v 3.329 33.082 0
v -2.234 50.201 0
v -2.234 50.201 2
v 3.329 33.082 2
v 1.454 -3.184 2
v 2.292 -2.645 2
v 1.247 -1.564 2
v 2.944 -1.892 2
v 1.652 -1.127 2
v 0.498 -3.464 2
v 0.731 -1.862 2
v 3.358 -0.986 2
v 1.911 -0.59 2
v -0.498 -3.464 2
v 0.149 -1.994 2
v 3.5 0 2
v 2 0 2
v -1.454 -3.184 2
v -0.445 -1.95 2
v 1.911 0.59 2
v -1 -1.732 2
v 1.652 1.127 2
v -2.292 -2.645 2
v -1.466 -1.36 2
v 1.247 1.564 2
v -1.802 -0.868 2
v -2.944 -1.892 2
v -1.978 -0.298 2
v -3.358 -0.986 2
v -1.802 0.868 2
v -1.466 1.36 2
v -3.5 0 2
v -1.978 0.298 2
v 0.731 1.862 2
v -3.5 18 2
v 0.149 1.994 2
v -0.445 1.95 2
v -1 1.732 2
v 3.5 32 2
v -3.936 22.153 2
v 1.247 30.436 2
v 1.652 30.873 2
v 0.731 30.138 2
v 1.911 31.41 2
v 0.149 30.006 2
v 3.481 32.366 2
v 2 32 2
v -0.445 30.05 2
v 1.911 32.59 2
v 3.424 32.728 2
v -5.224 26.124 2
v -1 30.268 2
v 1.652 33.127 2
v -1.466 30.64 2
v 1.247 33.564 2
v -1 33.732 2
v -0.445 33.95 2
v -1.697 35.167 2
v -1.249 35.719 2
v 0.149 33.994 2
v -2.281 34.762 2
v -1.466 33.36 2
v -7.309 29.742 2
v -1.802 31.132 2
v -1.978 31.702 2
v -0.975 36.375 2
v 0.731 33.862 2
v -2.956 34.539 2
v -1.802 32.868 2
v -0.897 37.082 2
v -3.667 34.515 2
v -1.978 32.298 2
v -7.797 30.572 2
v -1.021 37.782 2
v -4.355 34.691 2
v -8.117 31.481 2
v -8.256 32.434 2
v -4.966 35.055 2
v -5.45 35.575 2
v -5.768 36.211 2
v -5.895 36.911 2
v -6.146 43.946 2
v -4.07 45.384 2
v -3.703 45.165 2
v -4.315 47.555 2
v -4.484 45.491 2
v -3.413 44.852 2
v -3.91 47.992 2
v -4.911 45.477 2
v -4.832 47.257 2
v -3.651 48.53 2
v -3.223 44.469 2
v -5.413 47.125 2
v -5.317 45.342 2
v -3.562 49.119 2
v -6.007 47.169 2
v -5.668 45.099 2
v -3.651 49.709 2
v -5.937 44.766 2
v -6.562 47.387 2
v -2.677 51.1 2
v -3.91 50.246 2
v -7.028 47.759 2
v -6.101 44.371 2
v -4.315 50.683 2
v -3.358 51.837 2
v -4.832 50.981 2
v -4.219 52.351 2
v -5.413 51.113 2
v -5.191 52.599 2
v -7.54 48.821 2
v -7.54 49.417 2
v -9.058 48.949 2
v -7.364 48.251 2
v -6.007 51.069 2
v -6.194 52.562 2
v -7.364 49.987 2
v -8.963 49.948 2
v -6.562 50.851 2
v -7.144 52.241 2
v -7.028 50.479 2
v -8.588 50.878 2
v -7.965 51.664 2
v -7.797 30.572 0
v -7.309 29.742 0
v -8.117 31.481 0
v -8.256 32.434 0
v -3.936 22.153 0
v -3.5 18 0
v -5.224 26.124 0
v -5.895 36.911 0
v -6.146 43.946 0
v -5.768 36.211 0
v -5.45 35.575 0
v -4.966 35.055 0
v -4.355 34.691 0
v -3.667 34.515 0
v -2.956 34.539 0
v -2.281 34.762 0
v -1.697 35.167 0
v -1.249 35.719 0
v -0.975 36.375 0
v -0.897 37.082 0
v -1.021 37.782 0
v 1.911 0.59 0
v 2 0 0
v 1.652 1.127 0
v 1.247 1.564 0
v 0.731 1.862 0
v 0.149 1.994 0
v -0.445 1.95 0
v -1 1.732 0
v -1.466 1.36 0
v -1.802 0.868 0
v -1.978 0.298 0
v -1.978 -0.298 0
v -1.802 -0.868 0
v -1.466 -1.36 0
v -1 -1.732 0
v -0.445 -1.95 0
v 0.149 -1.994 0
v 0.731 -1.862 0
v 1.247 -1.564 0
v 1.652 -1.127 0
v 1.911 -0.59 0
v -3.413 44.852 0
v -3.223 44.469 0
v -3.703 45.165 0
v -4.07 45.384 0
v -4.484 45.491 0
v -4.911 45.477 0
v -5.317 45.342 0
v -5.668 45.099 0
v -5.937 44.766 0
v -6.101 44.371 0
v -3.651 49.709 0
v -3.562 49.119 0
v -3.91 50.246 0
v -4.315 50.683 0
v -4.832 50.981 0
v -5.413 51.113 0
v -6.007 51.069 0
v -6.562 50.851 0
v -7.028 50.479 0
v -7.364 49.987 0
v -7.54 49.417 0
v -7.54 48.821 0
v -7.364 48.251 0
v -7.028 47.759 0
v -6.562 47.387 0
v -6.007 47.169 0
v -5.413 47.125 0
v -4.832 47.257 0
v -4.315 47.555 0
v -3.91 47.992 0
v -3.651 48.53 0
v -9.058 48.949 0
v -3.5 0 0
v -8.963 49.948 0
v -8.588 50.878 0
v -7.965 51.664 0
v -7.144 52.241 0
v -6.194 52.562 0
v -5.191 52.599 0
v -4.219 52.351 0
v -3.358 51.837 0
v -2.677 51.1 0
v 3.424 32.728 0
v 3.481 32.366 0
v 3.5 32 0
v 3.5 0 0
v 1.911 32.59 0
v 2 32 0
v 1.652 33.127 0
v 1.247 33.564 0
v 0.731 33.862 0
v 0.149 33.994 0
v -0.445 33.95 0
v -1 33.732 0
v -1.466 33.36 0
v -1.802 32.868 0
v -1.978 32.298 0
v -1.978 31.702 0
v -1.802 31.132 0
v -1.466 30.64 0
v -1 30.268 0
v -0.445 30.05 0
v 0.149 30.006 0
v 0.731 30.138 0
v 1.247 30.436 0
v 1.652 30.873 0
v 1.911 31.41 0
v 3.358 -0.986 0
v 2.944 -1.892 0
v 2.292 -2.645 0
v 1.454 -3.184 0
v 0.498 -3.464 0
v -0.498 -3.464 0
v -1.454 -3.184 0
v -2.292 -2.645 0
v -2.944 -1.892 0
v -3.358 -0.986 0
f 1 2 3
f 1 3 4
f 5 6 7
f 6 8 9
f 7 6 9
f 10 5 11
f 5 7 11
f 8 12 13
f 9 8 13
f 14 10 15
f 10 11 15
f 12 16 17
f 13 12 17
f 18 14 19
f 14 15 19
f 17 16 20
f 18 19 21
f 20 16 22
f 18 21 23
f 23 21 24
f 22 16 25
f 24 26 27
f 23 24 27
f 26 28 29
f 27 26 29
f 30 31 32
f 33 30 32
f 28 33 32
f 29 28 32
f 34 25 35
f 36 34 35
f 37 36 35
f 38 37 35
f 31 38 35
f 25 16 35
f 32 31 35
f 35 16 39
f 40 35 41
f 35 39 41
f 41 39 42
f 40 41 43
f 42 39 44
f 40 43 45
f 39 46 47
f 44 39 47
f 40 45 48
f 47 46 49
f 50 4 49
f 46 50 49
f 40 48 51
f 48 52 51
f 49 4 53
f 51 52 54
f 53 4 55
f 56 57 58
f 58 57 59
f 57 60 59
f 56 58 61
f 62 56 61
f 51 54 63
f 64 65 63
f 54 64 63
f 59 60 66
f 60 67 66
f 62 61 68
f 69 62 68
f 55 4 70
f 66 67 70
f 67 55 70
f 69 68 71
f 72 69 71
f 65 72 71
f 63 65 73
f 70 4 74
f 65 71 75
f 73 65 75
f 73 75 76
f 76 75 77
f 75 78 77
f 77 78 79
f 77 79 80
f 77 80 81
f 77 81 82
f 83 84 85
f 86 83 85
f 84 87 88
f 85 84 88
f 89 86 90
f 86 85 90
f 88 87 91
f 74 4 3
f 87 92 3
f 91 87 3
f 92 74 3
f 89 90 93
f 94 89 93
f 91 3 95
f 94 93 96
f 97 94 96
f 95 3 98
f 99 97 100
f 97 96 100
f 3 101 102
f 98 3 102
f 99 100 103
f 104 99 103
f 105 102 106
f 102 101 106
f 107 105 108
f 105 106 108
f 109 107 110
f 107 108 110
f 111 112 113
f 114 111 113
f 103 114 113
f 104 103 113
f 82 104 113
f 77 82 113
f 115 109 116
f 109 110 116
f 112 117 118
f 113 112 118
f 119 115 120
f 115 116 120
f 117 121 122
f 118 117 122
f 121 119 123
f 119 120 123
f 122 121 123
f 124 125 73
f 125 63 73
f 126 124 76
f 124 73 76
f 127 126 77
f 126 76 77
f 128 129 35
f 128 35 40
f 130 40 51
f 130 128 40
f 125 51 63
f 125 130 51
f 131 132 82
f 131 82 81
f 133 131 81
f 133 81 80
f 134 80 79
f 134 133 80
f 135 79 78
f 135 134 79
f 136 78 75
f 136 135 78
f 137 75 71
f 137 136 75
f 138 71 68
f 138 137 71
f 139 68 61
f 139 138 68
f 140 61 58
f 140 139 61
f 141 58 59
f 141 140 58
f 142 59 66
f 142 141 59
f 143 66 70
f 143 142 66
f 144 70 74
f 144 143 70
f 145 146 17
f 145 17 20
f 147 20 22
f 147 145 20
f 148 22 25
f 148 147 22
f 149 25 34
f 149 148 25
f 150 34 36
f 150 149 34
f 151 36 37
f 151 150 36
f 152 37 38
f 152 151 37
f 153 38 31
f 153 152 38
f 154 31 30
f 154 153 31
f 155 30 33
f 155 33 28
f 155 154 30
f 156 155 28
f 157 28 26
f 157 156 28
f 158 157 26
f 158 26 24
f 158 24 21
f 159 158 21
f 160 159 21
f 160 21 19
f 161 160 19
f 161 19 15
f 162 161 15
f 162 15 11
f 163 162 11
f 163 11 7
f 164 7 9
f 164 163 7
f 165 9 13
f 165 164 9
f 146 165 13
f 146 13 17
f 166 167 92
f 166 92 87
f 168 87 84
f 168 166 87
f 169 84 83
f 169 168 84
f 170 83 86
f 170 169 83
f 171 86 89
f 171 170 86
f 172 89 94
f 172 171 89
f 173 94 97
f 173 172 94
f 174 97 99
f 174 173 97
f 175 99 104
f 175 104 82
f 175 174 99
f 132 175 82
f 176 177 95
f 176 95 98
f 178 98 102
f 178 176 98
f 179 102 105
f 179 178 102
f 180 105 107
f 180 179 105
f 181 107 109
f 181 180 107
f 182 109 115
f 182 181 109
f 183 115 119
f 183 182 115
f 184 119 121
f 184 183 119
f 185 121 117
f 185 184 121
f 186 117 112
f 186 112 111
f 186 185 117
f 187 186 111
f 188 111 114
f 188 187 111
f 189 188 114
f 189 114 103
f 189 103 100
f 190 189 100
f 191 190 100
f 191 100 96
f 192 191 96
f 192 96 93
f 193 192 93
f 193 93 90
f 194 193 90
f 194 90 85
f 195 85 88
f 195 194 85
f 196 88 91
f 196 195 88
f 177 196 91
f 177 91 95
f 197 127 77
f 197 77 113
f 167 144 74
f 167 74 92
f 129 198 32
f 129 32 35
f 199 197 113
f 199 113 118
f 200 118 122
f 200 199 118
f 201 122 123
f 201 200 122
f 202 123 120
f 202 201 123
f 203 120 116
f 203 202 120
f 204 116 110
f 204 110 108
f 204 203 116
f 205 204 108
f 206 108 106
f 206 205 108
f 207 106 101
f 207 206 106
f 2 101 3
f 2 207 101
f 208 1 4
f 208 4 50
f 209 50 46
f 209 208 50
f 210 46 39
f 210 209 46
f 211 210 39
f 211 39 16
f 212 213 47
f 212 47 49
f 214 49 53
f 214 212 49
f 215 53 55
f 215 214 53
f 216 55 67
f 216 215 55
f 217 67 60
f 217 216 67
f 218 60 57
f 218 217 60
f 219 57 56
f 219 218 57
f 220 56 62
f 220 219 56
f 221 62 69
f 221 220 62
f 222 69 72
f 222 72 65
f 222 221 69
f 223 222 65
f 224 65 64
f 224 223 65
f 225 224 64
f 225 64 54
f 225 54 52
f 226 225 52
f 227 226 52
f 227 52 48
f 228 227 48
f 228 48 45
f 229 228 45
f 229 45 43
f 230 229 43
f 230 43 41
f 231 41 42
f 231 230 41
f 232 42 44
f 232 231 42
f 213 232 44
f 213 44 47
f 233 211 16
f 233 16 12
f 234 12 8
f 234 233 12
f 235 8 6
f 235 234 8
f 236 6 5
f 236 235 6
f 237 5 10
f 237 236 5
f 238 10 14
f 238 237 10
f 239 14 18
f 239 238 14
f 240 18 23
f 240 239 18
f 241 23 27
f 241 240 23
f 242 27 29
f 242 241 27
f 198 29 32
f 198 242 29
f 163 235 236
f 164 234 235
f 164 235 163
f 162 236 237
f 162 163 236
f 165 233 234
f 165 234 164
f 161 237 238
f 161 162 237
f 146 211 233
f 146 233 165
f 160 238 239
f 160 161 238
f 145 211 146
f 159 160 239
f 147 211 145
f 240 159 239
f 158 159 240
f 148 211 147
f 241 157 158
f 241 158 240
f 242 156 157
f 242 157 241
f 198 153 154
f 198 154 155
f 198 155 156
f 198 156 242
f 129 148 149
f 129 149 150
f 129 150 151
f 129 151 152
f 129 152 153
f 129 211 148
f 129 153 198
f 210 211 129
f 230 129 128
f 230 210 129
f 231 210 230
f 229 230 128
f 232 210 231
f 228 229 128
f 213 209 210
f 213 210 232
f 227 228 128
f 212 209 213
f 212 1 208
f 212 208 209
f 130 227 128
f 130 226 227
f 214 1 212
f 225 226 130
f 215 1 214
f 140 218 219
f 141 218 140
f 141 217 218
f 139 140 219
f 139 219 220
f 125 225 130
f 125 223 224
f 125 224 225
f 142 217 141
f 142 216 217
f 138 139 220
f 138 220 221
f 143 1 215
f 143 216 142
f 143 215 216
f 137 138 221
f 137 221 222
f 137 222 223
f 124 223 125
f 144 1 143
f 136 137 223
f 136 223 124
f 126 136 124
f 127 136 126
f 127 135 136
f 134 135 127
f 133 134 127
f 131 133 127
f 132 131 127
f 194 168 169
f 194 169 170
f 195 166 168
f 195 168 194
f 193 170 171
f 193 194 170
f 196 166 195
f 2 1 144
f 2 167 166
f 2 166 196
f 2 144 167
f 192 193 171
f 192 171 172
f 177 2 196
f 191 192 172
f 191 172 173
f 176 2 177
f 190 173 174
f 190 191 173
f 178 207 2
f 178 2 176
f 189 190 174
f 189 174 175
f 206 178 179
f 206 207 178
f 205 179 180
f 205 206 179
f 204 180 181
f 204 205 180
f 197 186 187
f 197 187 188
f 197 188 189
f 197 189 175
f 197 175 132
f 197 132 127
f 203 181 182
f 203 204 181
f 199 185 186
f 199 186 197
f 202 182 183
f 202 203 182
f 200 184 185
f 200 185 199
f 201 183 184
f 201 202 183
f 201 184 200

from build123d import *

# Parameters (mm, degrees)
SKETCH_1_R      = 2
EXTRUDE_2_DEPTH = 2
FILLET_1_R      = 5


with BuildPart() as part:
    # 草图1 → 凸台-拉伸2 (new body)
    with BuildSketch(Plane.XY):
        with BuildLine():
            Line((3.5, 32), (3.5, 0))
            ThreePointArc((3.5, 0), (0, -3.5), (-3.5, 0))
            Line((-3.5, 0), (-3.5, 18))
            ThreePointArc((-3.5, 18), (-4.706147584, 24.840402867), (-8.179111138, 30.855752194))
            Line((-8.179111138, 30.855752194), (-9.058182296, 48.949169661))
            ThreePointArc((-9.058182296, 48.949169661), (-6.193568214, 52.5616192), (-2.233608092, 50.200576774))
            Line((-2.233608092, 50.200576774), (3.328697807, 33.08155948))
            ThreePointArc((3.328697807, 33.08155948), (3.456909192, 32.547520628), (3.5, 32))
        make_face()
        with Locations((0, 32)):
            Circle(SKETCH_1_R, mode=Mode.SUBTRACT)
        Circle(SKETCH_1_R, mode=Mode.SUBTRACT)
        with Locations((-5.562305899, 49.119017293)):
            Circle(SKETCH_1_R, mode=Mode.SUBTRACT)
        with BuildLine():
            Line((-6.146357487, 43.946342838), (-5.894516621, 36.910571396))
            ThreePointArc((-5.894516621, 36.910571396), (-2.956230896, 34.539004156), (-1.02143743, 37.781600094))
            Line((-1.02143743, 37.781600094), (-3.222509972, 44.468960057))
            ThreePointArc((-3.222509972, 44.468960057), (-4.91124893, 45.476597506), (-6.146357487, 43.946342838))
        make_face(mode=Mode.SUBTRACT)
    extrude(amount=EXTRUDE_2_DEPTH)

    # 圆角1
    fillet_1_edges = [part.edges().sort_by_distance(p)[0] for p in [
        (-8.179111138, 30.855752194, 1),
    ]]
    fillet(fillet_1_edges, radius=FILLET_1_R)


solid = part.part
